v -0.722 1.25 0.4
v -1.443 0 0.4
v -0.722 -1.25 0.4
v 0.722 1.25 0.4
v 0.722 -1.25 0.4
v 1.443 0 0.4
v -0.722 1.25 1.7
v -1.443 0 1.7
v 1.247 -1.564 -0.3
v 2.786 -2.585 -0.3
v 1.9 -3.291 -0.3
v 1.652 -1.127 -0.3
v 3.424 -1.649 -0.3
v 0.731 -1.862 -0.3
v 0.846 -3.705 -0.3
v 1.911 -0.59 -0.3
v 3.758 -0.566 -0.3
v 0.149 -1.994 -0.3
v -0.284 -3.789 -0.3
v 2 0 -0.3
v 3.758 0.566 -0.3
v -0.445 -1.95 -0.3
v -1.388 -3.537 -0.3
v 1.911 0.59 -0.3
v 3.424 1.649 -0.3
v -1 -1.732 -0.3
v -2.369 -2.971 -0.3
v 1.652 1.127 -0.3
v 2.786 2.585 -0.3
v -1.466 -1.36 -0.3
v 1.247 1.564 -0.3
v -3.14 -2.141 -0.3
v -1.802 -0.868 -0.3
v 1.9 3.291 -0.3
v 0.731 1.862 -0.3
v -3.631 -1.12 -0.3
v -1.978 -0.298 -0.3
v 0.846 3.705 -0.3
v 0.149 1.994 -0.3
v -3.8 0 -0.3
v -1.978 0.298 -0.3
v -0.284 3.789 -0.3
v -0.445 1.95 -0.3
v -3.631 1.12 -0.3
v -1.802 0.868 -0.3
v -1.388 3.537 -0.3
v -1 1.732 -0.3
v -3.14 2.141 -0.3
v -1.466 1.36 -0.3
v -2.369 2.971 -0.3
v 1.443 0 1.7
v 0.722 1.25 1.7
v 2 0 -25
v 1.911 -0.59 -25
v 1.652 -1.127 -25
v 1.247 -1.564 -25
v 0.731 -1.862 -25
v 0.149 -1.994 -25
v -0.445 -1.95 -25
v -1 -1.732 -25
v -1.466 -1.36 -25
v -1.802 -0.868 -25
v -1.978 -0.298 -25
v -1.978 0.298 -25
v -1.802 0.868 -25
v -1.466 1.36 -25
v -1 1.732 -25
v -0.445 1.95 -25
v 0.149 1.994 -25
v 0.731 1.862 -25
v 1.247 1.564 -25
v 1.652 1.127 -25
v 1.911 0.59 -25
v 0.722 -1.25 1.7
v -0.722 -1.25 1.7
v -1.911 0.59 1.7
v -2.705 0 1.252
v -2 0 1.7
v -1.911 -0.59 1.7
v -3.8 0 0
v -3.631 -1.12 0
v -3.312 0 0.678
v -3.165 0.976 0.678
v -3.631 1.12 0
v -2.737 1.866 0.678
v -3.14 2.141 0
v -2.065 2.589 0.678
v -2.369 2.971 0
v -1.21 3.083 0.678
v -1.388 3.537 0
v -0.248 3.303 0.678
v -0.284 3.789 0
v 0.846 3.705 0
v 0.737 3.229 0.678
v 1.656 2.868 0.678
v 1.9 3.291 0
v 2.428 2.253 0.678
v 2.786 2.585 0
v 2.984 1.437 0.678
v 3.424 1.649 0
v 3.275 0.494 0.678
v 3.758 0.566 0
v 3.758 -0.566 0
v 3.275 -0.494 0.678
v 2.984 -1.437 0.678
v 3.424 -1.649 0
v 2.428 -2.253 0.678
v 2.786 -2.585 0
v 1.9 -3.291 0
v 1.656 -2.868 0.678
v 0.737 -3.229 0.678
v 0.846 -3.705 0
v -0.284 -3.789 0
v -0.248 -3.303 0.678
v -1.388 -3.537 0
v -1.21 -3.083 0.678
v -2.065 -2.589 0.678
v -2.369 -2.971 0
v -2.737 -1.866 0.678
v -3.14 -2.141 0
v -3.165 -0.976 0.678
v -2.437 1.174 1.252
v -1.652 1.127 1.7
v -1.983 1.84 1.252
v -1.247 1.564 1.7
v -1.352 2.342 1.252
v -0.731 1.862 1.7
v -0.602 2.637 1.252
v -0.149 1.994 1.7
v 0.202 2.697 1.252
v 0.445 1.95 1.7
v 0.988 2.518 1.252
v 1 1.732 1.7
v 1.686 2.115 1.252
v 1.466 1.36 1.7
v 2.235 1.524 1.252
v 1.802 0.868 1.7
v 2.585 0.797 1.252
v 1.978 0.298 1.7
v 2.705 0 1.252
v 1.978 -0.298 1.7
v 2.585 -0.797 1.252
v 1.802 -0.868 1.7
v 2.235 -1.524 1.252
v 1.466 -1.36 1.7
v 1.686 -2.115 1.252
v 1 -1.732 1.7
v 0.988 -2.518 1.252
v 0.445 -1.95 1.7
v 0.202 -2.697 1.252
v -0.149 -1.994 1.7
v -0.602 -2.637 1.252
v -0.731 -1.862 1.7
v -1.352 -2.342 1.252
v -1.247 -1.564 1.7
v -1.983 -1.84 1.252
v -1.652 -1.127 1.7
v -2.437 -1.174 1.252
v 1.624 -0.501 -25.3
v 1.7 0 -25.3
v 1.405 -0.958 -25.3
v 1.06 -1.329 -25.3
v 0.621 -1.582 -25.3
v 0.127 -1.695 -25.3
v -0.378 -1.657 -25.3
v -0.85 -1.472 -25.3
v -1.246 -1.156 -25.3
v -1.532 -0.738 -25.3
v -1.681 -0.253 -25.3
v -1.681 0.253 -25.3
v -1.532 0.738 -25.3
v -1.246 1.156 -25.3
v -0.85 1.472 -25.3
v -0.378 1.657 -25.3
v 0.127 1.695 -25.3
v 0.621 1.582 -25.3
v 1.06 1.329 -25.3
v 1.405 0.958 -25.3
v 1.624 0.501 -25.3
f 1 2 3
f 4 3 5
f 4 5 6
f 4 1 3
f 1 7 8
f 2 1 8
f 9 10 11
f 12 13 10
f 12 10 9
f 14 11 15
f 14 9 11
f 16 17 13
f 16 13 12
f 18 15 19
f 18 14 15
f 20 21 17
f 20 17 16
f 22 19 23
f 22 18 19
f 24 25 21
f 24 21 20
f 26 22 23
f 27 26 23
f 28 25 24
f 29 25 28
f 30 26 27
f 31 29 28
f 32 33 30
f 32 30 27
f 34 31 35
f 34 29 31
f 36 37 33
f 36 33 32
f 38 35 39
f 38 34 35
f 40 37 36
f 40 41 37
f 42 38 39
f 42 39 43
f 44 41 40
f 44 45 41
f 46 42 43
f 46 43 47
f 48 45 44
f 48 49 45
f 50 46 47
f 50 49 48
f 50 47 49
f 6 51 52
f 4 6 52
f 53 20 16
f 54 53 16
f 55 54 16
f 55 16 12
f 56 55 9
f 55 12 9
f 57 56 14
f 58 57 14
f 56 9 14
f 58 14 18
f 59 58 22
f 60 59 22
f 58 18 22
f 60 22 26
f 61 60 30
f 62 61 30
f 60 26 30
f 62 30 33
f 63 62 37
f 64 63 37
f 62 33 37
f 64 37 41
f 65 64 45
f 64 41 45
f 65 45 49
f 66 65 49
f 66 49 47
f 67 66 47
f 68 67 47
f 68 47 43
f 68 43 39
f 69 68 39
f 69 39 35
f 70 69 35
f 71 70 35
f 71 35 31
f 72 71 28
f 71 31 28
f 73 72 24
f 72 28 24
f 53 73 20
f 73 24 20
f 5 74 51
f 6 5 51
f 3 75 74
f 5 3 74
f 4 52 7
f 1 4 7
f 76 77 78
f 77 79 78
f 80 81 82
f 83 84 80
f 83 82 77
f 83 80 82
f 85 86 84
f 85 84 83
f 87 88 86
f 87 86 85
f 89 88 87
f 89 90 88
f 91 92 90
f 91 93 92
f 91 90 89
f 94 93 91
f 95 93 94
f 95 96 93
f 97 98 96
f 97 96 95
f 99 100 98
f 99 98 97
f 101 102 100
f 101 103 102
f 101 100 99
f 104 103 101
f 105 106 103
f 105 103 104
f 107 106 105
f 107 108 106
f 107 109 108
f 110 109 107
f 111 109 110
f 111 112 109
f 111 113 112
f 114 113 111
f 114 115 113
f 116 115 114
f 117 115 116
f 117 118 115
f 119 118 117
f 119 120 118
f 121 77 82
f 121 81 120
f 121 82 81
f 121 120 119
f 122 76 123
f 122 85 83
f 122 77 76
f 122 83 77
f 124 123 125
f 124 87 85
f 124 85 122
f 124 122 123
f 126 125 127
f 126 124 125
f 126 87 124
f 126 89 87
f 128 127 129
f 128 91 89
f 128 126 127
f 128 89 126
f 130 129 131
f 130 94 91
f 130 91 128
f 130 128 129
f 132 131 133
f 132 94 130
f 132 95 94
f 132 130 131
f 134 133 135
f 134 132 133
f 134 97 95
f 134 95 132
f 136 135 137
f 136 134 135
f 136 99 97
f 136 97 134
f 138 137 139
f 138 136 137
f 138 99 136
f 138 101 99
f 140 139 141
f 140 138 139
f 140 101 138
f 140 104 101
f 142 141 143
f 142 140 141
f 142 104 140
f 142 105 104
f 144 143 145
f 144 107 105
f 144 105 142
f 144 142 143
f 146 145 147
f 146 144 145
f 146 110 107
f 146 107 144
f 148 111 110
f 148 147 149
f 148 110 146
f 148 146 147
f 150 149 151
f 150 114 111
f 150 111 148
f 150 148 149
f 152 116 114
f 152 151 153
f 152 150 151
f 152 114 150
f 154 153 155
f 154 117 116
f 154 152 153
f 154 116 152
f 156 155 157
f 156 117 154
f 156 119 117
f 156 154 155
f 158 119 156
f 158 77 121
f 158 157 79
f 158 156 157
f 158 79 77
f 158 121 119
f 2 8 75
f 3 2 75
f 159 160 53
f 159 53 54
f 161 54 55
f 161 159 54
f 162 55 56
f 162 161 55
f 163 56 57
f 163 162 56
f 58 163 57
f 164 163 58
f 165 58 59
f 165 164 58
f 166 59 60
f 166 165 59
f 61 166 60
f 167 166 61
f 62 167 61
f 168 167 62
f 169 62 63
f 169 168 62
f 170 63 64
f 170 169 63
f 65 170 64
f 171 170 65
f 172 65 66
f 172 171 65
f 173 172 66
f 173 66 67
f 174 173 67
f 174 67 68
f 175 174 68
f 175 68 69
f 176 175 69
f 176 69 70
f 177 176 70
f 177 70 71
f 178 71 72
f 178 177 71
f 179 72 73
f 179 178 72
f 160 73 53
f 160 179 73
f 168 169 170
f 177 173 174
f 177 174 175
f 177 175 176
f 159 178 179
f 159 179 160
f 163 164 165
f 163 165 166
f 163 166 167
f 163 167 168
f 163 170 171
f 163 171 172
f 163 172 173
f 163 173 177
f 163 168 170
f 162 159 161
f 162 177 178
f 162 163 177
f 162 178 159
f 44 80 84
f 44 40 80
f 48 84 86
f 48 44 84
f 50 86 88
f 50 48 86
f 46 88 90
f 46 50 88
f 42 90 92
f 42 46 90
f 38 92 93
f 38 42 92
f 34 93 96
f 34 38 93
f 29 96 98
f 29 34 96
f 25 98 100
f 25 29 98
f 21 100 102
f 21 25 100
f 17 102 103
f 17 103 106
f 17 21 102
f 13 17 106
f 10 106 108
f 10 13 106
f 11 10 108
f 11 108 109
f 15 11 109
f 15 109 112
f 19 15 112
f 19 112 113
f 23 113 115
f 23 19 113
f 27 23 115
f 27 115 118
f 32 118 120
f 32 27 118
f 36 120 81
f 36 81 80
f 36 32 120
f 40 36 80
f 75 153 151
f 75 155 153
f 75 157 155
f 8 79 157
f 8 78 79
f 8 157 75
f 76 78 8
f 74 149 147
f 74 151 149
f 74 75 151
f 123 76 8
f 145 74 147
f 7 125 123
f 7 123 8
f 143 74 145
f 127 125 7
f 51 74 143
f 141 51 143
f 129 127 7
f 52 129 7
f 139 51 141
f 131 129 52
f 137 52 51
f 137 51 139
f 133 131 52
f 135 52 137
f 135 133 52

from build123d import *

# Parameters (mm, degrees)
F3_DEPTH = 1.3
F4_R     = 2
F5_DEPTH = 25
F6_SIZE  = 0.3


with BuildPart() as f1:
    # F0 (on Front) → F1 (revolve)
    with BuildSketch(Plane.XZ):
        with BuildLine():
            Line((-3.8, 0), (-3.8, -0.3))
            Line((-3.8, -0.3), (0, -0.3))
            Line((0, -0.3), (0, 1.7))
            Line((0, 1.7), (-2, 1.7))
            ThreePointArc((-2, 1.7), (-3.022003, 0.979179), (-3.8, 0))
        make_face()
    revolve(axis=Axis((0, 0, 0.7), (0, 0, -1)))

    # F2 (on face) → F3 (cut)
    with BuildSketch(Plane.XY.offset(1.7)):
        Polygon((0.721688, 1.25), (-0.721688, 1.25), (-1.443376, 0), (-0.721688, -1.25), (0.721688, -1.25), (1.443376, 0), align=None)
    extrude(amount=-F3_DEPTH, mode=Mode.SUBTRACT)

    # F4 (on face) → F5 (join)
    with BuildSketch(Plane(origin=(0, 0, -0.3), x_dir=(1, 0, 0), z_dir=(0, 0, -1))):
        Circle(F4_R)
    extrude(amount=F5_DEPTH)

    # F6
    f6_edges = [f1.edges().sort_by_distance(p)[0] for p in [
        (-2, 0, -25.3),
    ]]
    chamfer(f6_edges, length=F6_SIZE)


solid = f1.part
